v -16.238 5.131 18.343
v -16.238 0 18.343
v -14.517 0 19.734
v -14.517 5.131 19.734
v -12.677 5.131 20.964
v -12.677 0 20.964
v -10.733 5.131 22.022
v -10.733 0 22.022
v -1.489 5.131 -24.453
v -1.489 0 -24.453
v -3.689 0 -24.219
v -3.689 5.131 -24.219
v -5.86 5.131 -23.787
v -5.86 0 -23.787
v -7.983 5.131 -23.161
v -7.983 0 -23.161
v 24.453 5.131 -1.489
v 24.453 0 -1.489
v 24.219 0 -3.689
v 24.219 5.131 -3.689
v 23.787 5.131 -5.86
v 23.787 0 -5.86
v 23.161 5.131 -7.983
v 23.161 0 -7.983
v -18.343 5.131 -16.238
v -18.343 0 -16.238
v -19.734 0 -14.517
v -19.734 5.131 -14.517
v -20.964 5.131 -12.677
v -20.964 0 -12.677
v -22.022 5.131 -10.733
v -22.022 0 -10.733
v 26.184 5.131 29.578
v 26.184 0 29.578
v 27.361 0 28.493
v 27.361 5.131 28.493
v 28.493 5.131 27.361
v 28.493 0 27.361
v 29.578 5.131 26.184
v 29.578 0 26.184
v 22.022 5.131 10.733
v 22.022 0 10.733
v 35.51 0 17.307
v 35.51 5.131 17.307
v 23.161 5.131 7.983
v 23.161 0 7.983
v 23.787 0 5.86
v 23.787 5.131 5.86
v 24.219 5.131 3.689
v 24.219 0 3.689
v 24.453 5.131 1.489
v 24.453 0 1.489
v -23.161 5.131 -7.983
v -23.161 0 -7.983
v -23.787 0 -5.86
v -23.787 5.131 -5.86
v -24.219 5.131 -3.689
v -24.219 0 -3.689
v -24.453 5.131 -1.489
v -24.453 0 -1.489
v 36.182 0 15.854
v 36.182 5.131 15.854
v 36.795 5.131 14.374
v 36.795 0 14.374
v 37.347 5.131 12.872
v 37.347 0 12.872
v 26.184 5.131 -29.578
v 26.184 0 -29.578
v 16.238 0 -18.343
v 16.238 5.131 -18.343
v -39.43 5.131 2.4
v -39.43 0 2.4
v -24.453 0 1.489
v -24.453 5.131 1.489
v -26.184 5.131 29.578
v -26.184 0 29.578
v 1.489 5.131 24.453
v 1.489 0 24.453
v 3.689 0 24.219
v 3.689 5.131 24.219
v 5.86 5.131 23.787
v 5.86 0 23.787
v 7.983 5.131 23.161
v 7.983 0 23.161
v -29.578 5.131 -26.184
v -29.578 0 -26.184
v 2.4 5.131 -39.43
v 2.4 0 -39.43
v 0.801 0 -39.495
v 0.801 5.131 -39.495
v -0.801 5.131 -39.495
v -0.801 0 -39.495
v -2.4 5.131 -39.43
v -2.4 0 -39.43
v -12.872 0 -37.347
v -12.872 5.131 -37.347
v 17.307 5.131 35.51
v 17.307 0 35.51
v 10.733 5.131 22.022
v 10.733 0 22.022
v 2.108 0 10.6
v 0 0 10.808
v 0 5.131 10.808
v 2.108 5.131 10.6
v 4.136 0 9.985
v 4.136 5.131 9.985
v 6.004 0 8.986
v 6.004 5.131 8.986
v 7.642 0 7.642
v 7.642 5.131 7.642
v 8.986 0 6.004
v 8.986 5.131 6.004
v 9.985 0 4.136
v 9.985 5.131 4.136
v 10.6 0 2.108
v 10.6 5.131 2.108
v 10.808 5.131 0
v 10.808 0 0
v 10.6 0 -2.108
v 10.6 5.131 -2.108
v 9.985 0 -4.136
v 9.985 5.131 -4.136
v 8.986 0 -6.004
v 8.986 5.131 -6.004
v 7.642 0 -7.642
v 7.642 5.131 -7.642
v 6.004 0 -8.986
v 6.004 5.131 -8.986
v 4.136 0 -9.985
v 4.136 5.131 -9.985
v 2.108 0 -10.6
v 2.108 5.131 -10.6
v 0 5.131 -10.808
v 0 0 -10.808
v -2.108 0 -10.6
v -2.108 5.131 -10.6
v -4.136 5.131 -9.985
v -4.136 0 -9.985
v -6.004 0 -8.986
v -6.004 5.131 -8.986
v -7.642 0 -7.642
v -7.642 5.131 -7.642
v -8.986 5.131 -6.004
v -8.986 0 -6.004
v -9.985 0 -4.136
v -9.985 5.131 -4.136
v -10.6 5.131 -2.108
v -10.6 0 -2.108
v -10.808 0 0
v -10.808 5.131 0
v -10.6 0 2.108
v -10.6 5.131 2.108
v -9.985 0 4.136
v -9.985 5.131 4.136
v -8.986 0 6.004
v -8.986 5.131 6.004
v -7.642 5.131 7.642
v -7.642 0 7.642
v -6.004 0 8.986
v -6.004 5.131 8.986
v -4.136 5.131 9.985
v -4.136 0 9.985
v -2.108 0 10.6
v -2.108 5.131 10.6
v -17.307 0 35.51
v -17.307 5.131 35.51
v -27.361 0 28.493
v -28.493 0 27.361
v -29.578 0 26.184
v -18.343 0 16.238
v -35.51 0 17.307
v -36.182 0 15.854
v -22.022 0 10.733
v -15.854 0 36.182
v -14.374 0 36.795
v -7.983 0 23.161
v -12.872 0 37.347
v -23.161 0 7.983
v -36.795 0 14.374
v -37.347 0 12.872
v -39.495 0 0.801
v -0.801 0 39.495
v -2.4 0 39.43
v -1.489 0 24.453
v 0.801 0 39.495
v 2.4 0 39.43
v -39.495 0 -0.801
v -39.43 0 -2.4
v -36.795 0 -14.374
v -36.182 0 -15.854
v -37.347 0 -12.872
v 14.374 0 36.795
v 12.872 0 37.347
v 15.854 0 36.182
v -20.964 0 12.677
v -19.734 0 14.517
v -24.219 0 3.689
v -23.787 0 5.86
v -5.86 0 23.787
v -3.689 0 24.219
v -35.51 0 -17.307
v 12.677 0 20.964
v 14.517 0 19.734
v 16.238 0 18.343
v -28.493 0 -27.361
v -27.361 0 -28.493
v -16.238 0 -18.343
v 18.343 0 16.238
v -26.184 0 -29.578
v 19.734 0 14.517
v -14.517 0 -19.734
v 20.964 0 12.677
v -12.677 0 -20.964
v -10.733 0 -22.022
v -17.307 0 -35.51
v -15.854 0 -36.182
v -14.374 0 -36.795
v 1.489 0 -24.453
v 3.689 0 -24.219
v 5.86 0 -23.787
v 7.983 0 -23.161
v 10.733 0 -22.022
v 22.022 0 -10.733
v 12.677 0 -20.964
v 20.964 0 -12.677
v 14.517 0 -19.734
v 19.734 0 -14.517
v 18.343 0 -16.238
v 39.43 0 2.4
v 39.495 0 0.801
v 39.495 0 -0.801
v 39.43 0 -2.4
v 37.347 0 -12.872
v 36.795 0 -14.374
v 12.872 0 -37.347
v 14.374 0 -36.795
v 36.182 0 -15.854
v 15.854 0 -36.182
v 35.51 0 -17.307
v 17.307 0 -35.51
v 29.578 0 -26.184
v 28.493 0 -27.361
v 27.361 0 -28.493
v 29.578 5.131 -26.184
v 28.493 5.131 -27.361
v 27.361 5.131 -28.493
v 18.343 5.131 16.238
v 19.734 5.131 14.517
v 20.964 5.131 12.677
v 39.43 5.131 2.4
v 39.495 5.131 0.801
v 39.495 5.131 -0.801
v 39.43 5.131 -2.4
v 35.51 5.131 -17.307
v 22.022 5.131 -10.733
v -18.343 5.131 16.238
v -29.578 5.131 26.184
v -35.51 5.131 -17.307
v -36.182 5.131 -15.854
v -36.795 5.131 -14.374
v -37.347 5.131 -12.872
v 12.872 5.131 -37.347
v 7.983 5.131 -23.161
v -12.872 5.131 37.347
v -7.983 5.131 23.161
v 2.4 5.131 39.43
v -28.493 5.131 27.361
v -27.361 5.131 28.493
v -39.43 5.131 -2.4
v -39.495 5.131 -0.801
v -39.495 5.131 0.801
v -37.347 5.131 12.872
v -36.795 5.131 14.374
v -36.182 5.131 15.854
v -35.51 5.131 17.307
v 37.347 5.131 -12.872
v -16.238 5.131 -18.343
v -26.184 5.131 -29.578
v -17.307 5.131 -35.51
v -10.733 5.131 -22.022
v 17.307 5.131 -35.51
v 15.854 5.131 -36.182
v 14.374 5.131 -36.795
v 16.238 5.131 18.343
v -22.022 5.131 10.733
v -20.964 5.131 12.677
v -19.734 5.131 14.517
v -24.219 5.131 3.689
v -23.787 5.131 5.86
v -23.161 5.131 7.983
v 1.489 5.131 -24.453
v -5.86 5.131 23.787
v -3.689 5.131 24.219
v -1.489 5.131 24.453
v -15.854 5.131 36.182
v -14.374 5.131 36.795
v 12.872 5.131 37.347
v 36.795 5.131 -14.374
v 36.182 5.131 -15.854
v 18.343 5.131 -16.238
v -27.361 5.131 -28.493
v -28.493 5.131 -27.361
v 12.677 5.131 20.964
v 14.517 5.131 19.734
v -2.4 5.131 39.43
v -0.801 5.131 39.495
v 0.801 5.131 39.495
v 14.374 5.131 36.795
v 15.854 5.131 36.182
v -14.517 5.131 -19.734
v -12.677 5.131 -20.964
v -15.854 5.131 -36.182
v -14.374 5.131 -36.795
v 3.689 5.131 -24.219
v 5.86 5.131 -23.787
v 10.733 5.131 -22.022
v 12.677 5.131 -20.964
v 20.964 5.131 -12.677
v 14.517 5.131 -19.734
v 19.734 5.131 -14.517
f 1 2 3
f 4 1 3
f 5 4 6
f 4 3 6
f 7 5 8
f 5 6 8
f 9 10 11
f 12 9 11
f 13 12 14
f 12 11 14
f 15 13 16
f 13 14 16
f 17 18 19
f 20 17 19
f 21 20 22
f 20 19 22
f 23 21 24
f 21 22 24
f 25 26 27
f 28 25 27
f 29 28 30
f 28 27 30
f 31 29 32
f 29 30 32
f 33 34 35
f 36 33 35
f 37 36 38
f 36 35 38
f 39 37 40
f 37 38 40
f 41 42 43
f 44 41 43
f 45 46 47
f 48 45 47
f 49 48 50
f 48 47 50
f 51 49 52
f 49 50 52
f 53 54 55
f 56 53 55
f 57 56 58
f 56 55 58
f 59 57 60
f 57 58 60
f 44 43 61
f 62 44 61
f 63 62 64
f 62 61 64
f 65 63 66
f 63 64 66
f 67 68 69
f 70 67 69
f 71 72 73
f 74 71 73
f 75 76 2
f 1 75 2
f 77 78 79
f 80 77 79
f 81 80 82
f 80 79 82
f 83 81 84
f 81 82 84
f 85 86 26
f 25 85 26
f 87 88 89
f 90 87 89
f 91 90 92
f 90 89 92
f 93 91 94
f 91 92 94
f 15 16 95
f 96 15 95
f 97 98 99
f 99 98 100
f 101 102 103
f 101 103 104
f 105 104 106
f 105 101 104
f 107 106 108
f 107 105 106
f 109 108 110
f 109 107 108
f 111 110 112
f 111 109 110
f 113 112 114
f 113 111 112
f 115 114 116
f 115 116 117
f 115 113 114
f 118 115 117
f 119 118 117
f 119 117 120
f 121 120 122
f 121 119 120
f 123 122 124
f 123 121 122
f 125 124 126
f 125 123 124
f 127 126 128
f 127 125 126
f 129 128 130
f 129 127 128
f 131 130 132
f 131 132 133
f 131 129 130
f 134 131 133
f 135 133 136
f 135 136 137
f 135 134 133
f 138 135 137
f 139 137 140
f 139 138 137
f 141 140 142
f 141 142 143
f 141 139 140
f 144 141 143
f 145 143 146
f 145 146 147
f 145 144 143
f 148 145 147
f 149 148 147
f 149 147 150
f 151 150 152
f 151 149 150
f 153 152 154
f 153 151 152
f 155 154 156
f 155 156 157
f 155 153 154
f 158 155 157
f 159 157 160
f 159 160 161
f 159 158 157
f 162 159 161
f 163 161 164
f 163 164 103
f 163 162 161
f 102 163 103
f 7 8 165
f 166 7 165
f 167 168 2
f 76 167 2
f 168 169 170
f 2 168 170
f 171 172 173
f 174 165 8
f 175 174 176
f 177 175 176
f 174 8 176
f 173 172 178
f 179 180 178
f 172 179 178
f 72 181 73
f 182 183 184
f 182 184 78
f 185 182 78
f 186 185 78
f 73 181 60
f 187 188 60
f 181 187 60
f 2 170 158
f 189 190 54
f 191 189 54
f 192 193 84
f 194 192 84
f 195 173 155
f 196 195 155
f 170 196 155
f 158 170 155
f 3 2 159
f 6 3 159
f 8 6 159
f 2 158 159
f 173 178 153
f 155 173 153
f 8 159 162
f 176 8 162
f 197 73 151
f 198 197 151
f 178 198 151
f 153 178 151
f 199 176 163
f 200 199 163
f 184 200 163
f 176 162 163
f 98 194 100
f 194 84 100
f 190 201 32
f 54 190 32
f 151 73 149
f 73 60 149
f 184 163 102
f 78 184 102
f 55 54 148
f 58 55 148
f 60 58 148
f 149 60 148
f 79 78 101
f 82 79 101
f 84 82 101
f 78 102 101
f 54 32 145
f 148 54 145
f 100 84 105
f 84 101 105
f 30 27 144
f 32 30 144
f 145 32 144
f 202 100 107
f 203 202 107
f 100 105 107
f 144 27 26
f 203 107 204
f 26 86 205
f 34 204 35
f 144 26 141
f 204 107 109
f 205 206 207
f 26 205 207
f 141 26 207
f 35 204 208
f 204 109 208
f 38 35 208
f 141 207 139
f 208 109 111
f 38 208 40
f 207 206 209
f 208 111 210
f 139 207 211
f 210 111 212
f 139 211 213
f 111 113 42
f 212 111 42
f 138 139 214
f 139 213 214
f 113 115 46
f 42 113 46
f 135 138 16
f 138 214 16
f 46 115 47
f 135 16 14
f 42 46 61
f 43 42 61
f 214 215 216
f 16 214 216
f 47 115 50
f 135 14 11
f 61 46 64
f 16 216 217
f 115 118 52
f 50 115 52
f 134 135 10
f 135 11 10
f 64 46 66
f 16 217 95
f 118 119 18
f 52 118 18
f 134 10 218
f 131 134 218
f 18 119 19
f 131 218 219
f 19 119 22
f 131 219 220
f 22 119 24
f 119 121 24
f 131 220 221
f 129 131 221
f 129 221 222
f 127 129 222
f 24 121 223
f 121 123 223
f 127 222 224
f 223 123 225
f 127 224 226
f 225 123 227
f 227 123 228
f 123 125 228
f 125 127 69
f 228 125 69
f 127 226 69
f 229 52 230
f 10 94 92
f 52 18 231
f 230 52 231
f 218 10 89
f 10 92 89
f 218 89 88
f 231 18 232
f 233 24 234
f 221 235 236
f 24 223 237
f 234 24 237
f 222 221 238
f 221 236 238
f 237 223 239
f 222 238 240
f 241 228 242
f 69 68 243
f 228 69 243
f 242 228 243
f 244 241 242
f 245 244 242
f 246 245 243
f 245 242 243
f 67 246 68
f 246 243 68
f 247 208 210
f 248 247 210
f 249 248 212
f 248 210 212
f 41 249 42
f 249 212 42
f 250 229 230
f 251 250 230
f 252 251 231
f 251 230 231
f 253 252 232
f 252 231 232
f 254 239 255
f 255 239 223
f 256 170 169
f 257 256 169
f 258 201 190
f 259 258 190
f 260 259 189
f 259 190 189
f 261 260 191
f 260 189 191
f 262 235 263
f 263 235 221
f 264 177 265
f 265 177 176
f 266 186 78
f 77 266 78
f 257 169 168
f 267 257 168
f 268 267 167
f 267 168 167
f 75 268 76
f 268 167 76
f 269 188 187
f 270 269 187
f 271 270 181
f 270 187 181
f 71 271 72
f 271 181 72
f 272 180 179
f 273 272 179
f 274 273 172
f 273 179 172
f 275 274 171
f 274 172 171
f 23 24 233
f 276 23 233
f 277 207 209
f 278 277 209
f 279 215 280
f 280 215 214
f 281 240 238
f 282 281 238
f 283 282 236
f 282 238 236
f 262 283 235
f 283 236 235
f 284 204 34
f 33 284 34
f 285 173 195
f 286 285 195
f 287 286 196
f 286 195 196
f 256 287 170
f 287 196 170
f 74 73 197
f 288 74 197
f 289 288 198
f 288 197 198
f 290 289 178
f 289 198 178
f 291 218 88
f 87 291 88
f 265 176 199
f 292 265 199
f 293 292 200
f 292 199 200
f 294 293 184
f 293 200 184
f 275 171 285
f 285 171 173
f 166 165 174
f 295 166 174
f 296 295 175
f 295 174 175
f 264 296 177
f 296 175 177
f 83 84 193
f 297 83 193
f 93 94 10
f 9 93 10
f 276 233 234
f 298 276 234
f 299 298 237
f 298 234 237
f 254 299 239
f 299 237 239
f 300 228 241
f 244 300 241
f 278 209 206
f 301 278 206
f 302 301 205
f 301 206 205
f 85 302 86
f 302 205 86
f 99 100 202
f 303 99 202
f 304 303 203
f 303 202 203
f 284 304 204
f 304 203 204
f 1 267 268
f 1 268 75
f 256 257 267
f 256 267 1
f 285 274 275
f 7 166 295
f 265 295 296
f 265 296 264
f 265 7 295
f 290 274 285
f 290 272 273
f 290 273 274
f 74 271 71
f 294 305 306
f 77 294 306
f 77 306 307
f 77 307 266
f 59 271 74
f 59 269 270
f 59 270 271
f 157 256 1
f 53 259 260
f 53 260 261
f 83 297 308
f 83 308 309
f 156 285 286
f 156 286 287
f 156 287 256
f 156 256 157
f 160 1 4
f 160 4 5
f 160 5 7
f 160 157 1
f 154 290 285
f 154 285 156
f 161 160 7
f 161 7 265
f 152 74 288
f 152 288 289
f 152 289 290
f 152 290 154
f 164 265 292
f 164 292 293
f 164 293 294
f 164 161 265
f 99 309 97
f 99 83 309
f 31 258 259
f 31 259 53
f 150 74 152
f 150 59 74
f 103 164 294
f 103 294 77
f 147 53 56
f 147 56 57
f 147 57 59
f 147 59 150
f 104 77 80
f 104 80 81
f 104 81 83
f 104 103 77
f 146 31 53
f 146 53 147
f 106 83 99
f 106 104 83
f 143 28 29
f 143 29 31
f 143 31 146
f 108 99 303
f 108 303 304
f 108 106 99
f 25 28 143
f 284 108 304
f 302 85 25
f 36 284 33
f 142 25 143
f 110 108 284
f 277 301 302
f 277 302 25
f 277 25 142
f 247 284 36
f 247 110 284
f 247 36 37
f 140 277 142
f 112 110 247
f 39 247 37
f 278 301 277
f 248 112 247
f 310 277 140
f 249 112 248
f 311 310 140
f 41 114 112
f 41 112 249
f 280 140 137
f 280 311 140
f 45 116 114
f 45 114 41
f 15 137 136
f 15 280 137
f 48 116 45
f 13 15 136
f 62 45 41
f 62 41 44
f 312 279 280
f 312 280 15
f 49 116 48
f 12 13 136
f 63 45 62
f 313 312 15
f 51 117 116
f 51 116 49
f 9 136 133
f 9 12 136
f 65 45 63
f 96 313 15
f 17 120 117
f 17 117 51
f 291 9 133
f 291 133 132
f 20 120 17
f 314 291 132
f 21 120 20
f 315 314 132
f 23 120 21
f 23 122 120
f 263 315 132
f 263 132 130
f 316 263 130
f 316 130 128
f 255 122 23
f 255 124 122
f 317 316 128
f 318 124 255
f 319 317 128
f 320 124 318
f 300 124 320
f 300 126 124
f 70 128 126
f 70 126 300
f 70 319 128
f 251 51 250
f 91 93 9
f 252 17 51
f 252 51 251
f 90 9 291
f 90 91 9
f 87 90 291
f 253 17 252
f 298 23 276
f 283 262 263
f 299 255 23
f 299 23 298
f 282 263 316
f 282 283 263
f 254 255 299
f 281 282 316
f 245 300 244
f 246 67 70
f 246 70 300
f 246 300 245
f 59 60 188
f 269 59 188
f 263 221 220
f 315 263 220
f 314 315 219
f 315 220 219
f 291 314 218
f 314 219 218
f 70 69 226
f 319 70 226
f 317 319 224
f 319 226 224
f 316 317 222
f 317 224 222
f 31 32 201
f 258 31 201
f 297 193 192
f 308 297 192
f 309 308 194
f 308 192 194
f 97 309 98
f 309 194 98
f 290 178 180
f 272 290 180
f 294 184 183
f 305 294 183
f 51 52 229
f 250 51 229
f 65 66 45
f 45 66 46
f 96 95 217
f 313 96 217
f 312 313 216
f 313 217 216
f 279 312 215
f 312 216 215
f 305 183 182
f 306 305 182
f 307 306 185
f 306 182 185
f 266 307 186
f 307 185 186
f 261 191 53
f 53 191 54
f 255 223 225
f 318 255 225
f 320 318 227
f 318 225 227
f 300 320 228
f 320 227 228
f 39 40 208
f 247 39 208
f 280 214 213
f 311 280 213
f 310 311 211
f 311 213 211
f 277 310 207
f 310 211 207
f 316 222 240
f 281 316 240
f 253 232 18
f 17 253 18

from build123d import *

# Parameters (mm, degrees)
SKETCH2_R           = 10.8077
BOSS_EXTRUDE1_DEPTH = 5.1308


with BuildPart() as part:
    # Sketch2 → Boss-Extrude1 (new body)
    with BuildSketch(Plane(origin=(0, 0, 0), x_dir=(1, 0, 0), z_dir=(0, 1, 0))):
        with BuildLine():
            Line((-17.306656678, 35.509756676), (-10.733030501, 22.022006247))
            ThreePointArc((-10.733030501, 22.022006247), (-13.61052624, 20.369592003), (-16.238327885, 18.34348414))
            Line((-16.238327885, 18.34348414), (-26.183766617, 29.578261448))
            ThreePointArc((-26.183766617, 29.578261448), (-27.932625947, 27.932625947), (-29.578261448, 26.183766617))
            Line((-29.578261448, 26.183766617), (-18.34348414, 16.238327885))
            ThreePointArc((-18.34348414, 16.238327885), (-20.369592003, 13.61052624), (-22.022006247, 10.733030501))
            Line((-22.022006247, 10.733030501), (-35.509756676, 17.306656678))
            ThreePointArc((-35.509756676, 17.306656678), (-36.495734573, 15.117028229), (-37.34684404, 12.871535447))
            Line((-37.34684404, 12.871535447), (-23.161308603, 7.982511303))
            ThreePointArc((-23.161308603, 7.982511303), (-24.027572035, 4.779381236), (-24.453033788, 1.488570263))
            Line((-24.453033788, 1.488570263), (-39.429708177, 2.400270314))
            ThreePointArc((-39.429708177, 2.400270314), (-39.502698446, 0), (-39.429708177, -2.400270314))
            Line((-39.429708177, -2.400270314), (-24.453033788, -1.488570263))
            ThreePointArc((-24.453033788, -1.488570263), (-24.027572035, -4.779381236), (-23.161308603, -7.982511303))
            Line((-23.161308603, -7.982511303), (-37.34684404, -12.871535447))
            ThreePointArc((-37.34684404, -12.871535447), (-36.495734573, -15.117028229), (-35.509756676, -17.306656678))
            Line((-35.509756676, -17.306656678), (-22.022006247, -10.733030501))
            ThreePointArc((-22.022006247, -10.733030501), (-20.369592003, -13.61052624), (-18.34348414, -16.238327885))
            Line((-18.34348414, -16.238327885), (-29.578261448, -26.183766617))
            ThreePointArc((-29.578261448, -26.183766617), (-27.932625947, -27.932625947), (-26.183766617, -29.578261448))
            Line((-26.183766617, -29.578261448), (-16.238327885, -18.34348414))
            ThreePointArc((-16.238327885, -18.34348414), (-13.61052624, -20.369592003), (-10.733030501, -22.022006247))
            Line((-10.733030501, -22.022006247), (-17.306656678, -35.509756676))
            ThreePointArc((-17.306656678, -35.509756676), (-15.117028229, -36.495734573), (-12.871535447, -37.34684404))
            Line((-12.871535447, -37.34684404), (-7.982511303, -23.161308603))
            ThreePointArc((-7.982511303, -23.161308603), (-4.779381236, -24.027572035), (-1.488570263, -24.453033788))
            Line((-1.488570263, -24.453033788), (-2.400270314, -39.429708177))
            ThreePointArc((-2.400270314, -39.429708177), (0, -39.502698446), (2.400270314, -39.429708177))
            Line((2.400270314, -39.429708177), (1.488570263, -24.453033788))
            ThreePointArc((1.488570263, -24.453033788), (4.779381236, -24.027572035), (7.982511303, -23.161308603))
            Line((7.982511303, -23.161308603), (12.871535447, -37.34684404))
            ThreePointArc((12.871535447, -37.34684404), (15.117028229, -36.495734573), (17.306656678, -35.509756676))
            Line((17.306656678, -35.509756676), (10.733030501, -22.022006247))
            ThreePointArc((10.733030501, -22.022006247), (13.61052624, -20.369592003), (16.238327885, -18.34348414))
            Line((16.238327885, -18.34348414), (26.183766617, -29.578261448))
            ThreePointArc((26.183766617, -29.578261448), (27.932625947, -27.932625947), (29.578261448, -26.183766617))
            Line((29.578261448, -26.183766617), (18.34348414, -16.238327885))
            ThreePointArc((18.34348414, -16.238327885), (20.369592003, -13.61052624), (22.022006247, -10.733030501))
            Line((22.022006247, -10.733030501), (35.509756676, -17.306656678))
            ThreePointArc((35.509756676, -17.306656678), (36.495734573, -15.117028229), (37.34684404, -12.871535447))
            Line((37.34684404, -12.871535447), (23.161308603, -7.982511303))
            ThreePointArc((23.161308603, -7.982511303), (24.027572035, -4.779381236), (24.453033788, -1.488570263))
            Line((24.453033788, -1.488570263), (39.429708177, -2.400270314))
            ThreePointArc((39.429708177, -2.400270314), (39.502698446, 0), (39.429708177, 2.400270314))
            Line((39.429708177, 2.400270314), (24.453033788, 1.488570263))
            ThreePointArc((24.453033788, 1.488570263), (24.027572035, 4.779381236), (23.161308603, 7.982511303))
            Line((23.161308603, 7.982511303), (37.34684404, 12.871535447))
            ThreePointArc((37.34684404, 12.871535447), (36.495734573, 15.117028229), (35.509756676, 17.306656678))
            Line((35.509756676, 17.306656678), (22.022006247, 10.733030501))
            ThreePointArc((22.022006247, 10.733030501), (20.369592003, 13.61052624), (18.34348414, 16.238327885))
            Line((18.34348414, 16.238327885), (29.578261448, 26.183766617))
            ThreePointArc((29.578261448, 26.183766617), (27.932625947, 27.932625947), (26.183766617, 29.578261448))
            Line((26.183766617, 29.578261448), (16.238327885, 18.34348414))
            ThreePointArc((16.238327885, 18.34348414), (13.61052624, 20.369592003), (10.733030501, 22.022006247))
            Line((10.733030501, 22.022006247), (17.306656678, 35.509756676))
            ThreePointArc((17.306656678, 35.509756676), (15.117028229, 36.495734573), (12.871535447, 37.34684404))
            Line((12.871535447, 37.34684404), (7.982511303, 23.161308603))
            ThreePointArc((7.982511303, 23.161308603), (4.779381236, 24.027572035), (1.488570263, 24.453033788))
            Line((1.488570263, 24.453033788), (2.400270314, 39.429708177))
            ThreePointArc((2.400270314, 39.429708177), (0, 39.502698446), (-2.400270314, 39.429708177))
            Line((-2.400270314, 39.429708177), (-1.488570263, 24.453033788))
            ThreePointArc((-1.488570263, 24.453033788), (-4.779381236, 24.027572035), (-7.982511303, 23.161308603))
            Line((-7.982511303, 23.161308603), (-12.871535447, 37.34684404))
            ThreePointArc((-12.871535447, 37.34684404), (-15.117028229, 36.495734573), (-17.306656678, 35.509756676))
        make_face()
        with Locations(Location((0, 0, 0), (0, 0, 270))):
            Circle(SKETCH2_R, mode=Mode.SUBTRACT)
    extrude(amount=BOSS_EXTRUDE1_DEPTH)


solid = part.part
